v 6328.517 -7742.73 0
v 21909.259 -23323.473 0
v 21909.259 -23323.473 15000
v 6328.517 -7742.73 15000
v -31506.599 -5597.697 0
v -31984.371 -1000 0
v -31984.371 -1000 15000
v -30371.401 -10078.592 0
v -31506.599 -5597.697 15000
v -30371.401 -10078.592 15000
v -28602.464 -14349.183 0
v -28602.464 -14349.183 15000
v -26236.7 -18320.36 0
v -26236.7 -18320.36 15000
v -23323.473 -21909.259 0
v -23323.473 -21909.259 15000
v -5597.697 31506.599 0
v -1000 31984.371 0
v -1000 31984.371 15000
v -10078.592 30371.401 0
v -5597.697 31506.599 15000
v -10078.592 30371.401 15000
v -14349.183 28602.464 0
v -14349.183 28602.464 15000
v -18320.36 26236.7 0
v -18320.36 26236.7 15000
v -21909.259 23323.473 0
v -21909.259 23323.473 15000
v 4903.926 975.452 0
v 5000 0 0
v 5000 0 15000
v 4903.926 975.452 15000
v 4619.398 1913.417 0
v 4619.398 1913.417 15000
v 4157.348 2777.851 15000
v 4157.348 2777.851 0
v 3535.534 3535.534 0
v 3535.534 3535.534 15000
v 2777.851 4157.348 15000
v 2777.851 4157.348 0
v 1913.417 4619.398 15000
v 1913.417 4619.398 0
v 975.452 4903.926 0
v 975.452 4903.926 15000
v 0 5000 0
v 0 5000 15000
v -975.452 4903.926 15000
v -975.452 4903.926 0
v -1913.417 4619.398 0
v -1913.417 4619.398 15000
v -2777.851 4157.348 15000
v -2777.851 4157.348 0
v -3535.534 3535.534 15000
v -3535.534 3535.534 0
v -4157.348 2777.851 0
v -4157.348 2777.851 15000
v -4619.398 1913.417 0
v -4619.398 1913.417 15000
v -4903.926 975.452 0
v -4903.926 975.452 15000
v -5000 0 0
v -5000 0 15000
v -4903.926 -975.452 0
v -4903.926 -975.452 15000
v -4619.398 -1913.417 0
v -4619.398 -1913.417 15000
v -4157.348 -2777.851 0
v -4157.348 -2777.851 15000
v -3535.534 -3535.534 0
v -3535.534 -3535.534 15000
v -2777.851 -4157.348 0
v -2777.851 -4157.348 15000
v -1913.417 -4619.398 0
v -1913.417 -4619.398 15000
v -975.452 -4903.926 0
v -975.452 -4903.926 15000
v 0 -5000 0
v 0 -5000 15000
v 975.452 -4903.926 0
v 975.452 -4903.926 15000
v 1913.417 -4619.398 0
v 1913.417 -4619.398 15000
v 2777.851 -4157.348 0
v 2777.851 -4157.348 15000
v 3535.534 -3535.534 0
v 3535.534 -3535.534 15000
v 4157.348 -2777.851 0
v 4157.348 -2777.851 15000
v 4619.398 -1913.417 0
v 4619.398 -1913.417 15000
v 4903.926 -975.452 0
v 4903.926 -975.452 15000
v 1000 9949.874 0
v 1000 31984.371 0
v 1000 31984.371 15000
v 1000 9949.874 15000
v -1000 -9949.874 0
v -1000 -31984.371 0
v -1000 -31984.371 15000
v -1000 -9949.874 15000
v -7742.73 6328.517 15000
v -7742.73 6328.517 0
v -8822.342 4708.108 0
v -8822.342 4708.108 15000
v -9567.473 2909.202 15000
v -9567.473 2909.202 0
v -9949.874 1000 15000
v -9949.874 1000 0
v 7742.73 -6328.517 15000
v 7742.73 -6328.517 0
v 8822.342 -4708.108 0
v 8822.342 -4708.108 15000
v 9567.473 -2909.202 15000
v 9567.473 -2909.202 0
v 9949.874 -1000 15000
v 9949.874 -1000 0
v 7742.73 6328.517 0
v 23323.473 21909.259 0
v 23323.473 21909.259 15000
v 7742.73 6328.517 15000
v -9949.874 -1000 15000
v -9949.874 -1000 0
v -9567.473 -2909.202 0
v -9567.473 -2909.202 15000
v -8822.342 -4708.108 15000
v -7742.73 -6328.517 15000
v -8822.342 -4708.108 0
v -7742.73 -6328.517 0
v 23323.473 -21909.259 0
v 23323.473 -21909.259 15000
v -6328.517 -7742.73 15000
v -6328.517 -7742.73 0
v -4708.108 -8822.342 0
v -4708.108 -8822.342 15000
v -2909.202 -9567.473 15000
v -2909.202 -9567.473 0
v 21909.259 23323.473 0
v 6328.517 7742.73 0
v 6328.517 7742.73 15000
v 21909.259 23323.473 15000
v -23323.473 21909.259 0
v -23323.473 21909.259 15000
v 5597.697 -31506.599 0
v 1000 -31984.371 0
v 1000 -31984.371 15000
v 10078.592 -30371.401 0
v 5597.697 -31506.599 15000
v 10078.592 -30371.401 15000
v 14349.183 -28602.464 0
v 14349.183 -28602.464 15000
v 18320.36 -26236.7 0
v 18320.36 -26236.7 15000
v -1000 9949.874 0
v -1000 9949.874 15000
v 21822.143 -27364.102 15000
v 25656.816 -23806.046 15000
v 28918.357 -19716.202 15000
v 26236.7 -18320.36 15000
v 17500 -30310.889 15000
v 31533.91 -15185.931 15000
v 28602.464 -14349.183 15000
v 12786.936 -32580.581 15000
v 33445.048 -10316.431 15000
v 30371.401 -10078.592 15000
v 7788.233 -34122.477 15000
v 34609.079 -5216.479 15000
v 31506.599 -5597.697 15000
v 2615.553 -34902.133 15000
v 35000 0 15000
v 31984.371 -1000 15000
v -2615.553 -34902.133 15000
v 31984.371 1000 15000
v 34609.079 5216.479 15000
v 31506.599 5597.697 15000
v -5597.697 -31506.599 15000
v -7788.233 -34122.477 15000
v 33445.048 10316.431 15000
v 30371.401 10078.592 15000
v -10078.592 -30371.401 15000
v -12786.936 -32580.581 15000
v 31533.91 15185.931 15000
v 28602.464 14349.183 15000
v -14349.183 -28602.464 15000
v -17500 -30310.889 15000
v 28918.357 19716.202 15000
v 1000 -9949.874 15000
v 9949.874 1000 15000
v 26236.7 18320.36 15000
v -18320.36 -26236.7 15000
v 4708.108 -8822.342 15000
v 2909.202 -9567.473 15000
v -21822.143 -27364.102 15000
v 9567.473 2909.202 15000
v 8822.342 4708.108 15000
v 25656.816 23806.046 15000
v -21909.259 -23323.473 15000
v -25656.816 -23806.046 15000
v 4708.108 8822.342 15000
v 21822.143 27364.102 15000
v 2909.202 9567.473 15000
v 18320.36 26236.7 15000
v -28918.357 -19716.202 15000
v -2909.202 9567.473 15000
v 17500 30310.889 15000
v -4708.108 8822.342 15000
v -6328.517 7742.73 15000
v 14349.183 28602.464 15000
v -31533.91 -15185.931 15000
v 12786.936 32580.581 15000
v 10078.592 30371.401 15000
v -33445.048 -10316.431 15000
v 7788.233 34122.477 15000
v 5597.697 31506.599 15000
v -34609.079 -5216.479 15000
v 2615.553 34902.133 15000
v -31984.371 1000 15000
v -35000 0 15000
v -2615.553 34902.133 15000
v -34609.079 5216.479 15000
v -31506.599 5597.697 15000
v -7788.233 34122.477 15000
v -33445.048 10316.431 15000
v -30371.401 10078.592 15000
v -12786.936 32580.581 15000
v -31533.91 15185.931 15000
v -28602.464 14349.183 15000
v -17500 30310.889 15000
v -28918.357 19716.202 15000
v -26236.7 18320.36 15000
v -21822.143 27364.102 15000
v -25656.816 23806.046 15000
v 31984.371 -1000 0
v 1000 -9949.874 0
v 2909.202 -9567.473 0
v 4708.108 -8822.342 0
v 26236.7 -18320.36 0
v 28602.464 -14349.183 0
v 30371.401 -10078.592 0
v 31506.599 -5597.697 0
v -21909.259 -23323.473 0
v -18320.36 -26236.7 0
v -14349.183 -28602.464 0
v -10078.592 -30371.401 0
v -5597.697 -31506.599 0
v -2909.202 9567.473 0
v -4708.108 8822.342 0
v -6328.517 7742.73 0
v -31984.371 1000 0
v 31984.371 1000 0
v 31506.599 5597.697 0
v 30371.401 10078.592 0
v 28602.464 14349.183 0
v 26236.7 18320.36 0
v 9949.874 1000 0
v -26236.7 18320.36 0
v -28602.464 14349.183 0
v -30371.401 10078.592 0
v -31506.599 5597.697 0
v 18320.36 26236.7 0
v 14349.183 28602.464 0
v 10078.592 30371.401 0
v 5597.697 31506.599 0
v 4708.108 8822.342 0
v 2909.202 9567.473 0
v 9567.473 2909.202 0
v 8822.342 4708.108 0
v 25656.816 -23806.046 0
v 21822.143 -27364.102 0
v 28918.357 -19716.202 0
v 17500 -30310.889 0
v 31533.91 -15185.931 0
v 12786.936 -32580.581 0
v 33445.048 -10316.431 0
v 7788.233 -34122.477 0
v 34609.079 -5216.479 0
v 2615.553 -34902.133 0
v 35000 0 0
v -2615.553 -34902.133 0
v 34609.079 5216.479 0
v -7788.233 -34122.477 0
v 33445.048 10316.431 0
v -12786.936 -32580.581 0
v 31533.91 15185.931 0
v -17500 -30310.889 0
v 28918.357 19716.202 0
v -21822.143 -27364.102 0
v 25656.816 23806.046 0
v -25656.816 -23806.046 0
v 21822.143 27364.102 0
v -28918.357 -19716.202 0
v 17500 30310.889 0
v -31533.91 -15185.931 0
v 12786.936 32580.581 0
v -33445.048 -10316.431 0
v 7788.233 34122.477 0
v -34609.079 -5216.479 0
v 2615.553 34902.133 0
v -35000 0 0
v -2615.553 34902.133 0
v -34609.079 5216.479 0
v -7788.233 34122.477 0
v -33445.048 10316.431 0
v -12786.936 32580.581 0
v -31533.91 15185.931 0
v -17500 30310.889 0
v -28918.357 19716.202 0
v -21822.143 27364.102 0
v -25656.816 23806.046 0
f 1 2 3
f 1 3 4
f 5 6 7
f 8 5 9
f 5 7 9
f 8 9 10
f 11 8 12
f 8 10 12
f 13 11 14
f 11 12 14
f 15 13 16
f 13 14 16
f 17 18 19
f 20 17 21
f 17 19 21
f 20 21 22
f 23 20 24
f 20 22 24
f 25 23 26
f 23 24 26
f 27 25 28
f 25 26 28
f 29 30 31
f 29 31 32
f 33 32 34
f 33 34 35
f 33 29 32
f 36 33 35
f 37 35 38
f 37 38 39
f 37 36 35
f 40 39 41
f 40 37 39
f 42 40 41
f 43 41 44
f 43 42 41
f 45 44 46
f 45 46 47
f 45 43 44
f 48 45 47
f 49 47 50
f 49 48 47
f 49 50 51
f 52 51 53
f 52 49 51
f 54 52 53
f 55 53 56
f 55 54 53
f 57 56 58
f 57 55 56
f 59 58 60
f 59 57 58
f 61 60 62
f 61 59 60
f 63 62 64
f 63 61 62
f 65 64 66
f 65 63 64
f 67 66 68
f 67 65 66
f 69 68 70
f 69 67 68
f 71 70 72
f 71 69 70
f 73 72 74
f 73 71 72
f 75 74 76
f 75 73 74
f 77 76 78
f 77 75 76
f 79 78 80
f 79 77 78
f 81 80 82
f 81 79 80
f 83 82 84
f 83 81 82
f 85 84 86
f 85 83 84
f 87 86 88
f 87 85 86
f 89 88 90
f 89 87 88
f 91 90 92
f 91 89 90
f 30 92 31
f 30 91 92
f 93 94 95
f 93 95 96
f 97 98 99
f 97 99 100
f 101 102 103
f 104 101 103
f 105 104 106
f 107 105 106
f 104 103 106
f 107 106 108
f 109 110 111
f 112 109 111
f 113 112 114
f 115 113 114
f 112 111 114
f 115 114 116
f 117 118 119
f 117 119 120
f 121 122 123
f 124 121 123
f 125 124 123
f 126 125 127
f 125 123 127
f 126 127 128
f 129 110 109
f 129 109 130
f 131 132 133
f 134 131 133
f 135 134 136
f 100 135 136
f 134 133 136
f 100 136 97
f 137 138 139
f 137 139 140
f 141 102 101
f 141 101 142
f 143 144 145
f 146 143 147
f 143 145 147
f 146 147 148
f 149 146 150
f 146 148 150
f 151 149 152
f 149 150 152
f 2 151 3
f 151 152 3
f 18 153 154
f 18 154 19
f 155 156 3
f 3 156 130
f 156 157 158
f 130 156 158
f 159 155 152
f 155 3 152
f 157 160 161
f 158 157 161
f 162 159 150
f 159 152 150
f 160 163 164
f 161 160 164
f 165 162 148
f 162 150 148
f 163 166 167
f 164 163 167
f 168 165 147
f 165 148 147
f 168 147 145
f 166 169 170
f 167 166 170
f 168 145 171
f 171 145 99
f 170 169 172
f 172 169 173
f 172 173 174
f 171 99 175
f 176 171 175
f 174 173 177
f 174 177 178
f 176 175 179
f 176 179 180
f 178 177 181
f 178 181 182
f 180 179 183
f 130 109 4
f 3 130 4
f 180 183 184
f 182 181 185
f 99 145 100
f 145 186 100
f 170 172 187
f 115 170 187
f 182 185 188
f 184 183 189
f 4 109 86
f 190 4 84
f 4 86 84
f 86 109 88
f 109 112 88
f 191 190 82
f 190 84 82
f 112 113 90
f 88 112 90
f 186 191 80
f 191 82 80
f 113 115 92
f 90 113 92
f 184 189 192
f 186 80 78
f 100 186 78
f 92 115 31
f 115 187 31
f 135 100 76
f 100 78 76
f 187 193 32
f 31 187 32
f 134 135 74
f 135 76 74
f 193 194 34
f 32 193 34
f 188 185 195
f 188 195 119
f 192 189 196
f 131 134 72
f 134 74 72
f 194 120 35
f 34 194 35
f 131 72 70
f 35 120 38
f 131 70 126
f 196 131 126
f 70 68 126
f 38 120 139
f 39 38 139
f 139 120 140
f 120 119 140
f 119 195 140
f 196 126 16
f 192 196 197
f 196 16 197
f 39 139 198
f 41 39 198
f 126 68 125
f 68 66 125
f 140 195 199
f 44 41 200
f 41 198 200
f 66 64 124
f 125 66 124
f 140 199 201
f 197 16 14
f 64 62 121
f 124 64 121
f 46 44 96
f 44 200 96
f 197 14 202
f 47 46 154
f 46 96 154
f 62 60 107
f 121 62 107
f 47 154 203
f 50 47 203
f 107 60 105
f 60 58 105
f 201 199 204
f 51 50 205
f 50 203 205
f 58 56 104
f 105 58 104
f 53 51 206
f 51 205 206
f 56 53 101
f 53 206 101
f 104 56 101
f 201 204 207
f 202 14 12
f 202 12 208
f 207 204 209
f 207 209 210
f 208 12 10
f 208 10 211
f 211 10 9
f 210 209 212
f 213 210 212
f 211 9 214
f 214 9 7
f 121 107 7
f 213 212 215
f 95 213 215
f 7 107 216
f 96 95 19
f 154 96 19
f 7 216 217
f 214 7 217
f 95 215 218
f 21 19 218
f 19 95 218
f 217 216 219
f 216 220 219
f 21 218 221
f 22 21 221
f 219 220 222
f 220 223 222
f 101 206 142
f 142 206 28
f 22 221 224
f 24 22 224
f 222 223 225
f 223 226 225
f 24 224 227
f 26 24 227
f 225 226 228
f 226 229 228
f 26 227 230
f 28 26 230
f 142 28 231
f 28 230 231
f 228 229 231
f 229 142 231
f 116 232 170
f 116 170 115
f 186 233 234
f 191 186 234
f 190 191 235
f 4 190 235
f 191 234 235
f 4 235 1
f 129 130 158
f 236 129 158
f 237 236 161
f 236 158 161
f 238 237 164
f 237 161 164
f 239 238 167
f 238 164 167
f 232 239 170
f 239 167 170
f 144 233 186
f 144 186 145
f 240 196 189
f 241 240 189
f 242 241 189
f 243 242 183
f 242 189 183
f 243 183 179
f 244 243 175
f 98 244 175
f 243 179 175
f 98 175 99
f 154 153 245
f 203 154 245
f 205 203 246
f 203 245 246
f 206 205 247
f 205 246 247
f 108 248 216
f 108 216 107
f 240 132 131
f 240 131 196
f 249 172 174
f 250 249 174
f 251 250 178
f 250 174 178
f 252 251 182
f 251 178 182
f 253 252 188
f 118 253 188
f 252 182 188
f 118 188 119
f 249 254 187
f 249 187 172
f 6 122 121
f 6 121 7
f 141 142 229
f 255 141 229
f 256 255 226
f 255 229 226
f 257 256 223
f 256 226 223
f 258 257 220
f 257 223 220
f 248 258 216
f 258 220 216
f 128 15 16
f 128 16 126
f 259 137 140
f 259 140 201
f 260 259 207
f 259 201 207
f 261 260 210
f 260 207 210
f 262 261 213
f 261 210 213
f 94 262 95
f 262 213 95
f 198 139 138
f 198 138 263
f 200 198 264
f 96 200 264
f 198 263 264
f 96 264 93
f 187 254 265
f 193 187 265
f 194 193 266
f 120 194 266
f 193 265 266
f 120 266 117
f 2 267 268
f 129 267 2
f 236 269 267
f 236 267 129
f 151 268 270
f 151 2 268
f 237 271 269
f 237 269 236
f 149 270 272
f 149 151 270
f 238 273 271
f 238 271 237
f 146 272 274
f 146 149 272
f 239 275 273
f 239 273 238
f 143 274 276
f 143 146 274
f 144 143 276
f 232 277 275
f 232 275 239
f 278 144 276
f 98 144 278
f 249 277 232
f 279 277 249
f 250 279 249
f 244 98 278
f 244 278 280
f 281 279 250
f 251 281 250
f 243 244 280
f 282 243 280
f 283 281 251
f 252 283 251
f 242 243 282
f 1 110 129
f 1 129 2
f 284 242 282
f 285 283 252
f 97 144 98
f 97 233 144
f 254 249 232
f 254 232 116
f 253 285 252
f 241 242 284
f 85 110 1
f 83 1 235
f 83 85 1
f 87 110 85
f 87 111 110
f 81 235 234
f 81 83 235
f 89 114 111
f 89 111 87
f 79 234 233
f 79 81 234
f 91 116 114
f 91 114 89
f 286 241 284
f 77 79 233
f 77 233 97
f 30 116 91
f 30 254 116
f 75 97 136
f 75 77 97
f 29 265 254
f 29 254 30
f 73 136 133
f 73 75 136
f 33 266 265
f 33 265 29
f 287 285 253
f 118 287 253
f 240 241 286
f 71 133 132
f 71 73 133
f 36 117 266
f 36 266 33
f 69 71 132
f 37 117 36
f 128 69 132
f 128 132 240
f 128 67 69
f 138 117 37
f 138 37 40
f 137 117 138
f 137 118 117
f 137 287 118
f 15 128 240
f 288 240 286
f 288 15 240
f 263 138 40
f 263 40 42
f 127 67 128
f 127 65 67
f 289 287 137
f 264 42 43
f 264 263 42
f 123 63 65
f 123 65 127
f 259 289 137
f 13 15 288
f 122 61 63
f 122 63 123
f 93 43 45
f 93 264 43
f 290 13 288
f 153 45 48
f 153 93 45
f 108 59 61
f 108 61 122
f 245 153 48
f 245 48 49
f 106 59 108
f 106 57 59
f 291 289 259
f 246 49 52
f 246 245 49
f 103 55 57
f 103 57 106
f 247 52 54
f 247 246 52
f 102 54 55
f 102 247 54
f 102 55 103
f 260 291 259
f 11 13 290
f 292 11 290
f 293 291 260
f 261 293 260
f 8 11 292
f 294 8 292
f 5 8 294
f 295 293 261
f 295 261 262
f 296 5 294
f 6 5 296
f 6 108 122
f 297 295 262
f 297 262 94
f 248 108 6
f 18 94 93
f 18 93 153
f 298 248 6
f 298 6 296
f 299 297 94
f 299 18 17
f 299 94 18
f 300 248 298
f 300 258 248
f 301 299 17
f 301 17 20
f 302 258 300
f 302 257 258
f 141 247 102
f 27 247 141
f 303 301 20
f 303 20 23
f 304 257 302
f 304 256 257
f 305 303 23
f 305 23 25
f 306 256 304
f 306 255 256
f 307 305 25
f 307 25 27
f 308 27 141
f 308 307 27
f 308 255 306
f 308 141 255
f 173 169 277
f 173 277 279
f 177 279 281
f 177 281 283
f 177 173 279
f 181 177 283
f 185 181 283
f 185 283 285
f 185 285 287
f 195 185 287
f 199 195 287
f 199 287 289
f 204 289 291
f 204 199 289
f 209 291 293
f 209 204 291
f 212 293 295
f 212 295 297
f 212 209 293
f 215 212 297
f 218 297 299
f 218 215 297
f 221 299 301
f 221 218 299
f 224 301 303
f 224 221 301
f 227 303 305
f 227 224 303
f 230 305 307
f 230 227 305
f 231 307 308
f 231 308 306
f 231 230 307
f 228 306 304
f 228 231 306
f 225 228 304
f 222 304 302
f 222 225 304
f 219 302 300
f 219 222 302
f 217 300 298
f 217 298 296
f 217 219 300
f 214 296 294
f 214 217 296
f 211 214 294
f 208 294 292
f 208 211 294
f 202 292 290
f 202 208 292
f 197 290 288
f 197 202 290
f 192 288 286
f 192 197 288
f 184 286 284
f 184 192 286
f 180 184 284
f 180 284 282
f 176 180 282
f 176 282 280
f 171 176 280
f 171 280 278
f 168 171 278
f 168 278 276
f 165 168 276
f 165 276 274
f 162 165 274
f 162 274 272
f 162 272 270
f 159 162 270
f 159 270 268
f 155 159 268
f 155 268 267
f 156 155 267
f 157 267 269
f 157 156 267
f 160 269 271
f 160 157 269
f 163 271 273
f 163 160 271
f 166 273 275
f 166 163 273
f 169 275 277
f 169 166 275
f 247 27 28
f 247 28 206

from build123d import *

# Parameters (mm, degrees)
SKETCH1_R           = 10000
SKETCH1_R_2         = 5000
BOSS_EXTRUDE1_DEPTH = 15000
SKETCH2_R           = 35000
SKETCH2_R_2         = 32000
BOSS_EXTRUDE5_DEPTH = 15000
BOSS_EXTRUDE6_DEPTH = 15000


with BuildPart() as part:
    # Sketch1 → Boss-Extrude1 (new body)
    with BuildSketch(Plane.XY):
        Circle(SKETCH1_R)
        Circle(SKETCH1_R_2, mode=Mode.SUBTRACT)
    extrude(amount=BOSS_EXTRUDE1_DEPTH)



with BuildPart() as body_2:
    # Sketch2 → Boss-Extrude5 (new body)
    with BuildSketch(Plane.XY.offset(15000)):
        Circle(SKETCH2_R)
        Circle(SKETCH2_R_2, mode=Mode.SUBTRACT)
    extrude(amount=-BOSS_EXTRUDE5_DEPTH)


with BuildPart() as part_1:
    add(part.part)

    add(body_2.part)  # Boss-Extrude6 merges body 2
    # Sketch3 → Boss-Extrude6 (add)
    with BuildSketch(Plane.XY):
        with BuildLine():
            Line((6328.516858549, 7742.730420922), (21909.258974611, 23323.472536984))
            ThreePointArc((21909.258974611, 23323.472536984), (22627.41699797, 22627.41699797), (23323.472536985, 21909.258974611))
            Line((23323.472536985, 21909.258974611), (7742.730420922, 6328.516858549))
            ThreePointArc((7742.730420922, 6328.516858549), (7071.067811865, 7071.067811865), (6328.516858549, 7742.730420922))
        make_face()
        with BuildLine():
            Line((-1000, 9949.874371066), (-1000, 31984.37118344))
            ThreePointArc((-1000, 31984.37118344), (0, 32000.000000001), (1000, 31984.37118344))
            Line((1000, 31984.37118344), (1000, 9949.874371066))
            ThreePointArc((1000, 9949.874371066), (0, 10000), (-1000, 9949.874371066))
        make_face()
        with BuildLine():
            Line((9949.874371066, 1000), (31984.37118344, 1000))
            ThreePointArc((31984.37118344, 1000), (32000.000000001, 0), (31984.37118344, -1000))
            Line((31984.37118344, -1000), (9949.874371066, -1000))
            ThreePointArc((9949.874371066, -1000), (10000, 0), (9949.874371066, 1000))
        make_face()
        with BuildLine():
            Line((7742.730420922, -6328.516858549), (23323.472536984, -21909.258974611))
            ThreePointArc((23323.472536984, -21909.258974611), (22627.41699797, -22627.41699797), (21909.258974611, -23323.472536985))
            Line((21909.258974611, -23323.472536985), (6328.516858549, -7742.730420922))
            ThreePointArc((6328.516858549, -7742.730420922), (7071.067811865, -7071.067811866), (7742.730420922, -6328.516858549))
        make_face()
        with BuildLine():
            Line((1000, -9949.874371066), (1000, -31984.37118344))
            ThreePointArc((1000, -31984.37118344), (0, -32000.000000001), (-1000, -31984.37118344))
            Line((-1000, -31984.37118344), (-1000, -9949.874371066))
            ThreePointArc((-1000, -9949.874371066), (0, -10000), (1000, -9949.874371066))
        make_face()
        with BuildLine():
            Line((-6328.516858549, -7742.730420922), (-21909.258974611, -23323.472536984))
            ThreePointArc((-21909.258974611, -23323.472536984), (-22627.41699797, -22627.41699797), (-23323.472536985, -21909.258974611))
            Line((-23323.472536985, -21909.258974611), (-7742.730420922, -6328.516858549))
            ThreePointArc((-7742.730420922, -6328.516858549), (-7071.067811866, -7071.067811865), (-6328.516858549, -7742.730420922))
        make_face()
        with BuildLine():
            Line((-9949.874371066, -1000), (-31984.37118344, -1000))
            ThreePointArc((-31984.37118344, -1000), (-32000.000000001, 0), (-31984.37118344, 1000))
            Line((-31984.37118344, 1000), (-9949.874371066, 1000))
            ThreePointArc((-9949.874371066, 1000), (-10000, 0), (-9949.874371066, -1000))
        make_face()
        with BuildLine():
            Line((-7742.730420922, 6328.516858549), (-23323.472536984, 21909.258974611))
            ThreePointArc((-23323.472536984, 21909.258974611), (-22627.41699797, 22627.41699797), (-21909.258974611, 23323.472536985))
            Line((-21909.258974611, 23323.472536985), (-6328.516858549, 7742.730420922))
            ThreePointArc((-6328.516858549, 7742.730420922), (-7071.067811865, 7071.067811866), (-7742.730420922, 6328.516858549))
        make_face()
    extrude(amount=BOSS_EXTRUDE6_DEPTH)


solid = part_1.part
